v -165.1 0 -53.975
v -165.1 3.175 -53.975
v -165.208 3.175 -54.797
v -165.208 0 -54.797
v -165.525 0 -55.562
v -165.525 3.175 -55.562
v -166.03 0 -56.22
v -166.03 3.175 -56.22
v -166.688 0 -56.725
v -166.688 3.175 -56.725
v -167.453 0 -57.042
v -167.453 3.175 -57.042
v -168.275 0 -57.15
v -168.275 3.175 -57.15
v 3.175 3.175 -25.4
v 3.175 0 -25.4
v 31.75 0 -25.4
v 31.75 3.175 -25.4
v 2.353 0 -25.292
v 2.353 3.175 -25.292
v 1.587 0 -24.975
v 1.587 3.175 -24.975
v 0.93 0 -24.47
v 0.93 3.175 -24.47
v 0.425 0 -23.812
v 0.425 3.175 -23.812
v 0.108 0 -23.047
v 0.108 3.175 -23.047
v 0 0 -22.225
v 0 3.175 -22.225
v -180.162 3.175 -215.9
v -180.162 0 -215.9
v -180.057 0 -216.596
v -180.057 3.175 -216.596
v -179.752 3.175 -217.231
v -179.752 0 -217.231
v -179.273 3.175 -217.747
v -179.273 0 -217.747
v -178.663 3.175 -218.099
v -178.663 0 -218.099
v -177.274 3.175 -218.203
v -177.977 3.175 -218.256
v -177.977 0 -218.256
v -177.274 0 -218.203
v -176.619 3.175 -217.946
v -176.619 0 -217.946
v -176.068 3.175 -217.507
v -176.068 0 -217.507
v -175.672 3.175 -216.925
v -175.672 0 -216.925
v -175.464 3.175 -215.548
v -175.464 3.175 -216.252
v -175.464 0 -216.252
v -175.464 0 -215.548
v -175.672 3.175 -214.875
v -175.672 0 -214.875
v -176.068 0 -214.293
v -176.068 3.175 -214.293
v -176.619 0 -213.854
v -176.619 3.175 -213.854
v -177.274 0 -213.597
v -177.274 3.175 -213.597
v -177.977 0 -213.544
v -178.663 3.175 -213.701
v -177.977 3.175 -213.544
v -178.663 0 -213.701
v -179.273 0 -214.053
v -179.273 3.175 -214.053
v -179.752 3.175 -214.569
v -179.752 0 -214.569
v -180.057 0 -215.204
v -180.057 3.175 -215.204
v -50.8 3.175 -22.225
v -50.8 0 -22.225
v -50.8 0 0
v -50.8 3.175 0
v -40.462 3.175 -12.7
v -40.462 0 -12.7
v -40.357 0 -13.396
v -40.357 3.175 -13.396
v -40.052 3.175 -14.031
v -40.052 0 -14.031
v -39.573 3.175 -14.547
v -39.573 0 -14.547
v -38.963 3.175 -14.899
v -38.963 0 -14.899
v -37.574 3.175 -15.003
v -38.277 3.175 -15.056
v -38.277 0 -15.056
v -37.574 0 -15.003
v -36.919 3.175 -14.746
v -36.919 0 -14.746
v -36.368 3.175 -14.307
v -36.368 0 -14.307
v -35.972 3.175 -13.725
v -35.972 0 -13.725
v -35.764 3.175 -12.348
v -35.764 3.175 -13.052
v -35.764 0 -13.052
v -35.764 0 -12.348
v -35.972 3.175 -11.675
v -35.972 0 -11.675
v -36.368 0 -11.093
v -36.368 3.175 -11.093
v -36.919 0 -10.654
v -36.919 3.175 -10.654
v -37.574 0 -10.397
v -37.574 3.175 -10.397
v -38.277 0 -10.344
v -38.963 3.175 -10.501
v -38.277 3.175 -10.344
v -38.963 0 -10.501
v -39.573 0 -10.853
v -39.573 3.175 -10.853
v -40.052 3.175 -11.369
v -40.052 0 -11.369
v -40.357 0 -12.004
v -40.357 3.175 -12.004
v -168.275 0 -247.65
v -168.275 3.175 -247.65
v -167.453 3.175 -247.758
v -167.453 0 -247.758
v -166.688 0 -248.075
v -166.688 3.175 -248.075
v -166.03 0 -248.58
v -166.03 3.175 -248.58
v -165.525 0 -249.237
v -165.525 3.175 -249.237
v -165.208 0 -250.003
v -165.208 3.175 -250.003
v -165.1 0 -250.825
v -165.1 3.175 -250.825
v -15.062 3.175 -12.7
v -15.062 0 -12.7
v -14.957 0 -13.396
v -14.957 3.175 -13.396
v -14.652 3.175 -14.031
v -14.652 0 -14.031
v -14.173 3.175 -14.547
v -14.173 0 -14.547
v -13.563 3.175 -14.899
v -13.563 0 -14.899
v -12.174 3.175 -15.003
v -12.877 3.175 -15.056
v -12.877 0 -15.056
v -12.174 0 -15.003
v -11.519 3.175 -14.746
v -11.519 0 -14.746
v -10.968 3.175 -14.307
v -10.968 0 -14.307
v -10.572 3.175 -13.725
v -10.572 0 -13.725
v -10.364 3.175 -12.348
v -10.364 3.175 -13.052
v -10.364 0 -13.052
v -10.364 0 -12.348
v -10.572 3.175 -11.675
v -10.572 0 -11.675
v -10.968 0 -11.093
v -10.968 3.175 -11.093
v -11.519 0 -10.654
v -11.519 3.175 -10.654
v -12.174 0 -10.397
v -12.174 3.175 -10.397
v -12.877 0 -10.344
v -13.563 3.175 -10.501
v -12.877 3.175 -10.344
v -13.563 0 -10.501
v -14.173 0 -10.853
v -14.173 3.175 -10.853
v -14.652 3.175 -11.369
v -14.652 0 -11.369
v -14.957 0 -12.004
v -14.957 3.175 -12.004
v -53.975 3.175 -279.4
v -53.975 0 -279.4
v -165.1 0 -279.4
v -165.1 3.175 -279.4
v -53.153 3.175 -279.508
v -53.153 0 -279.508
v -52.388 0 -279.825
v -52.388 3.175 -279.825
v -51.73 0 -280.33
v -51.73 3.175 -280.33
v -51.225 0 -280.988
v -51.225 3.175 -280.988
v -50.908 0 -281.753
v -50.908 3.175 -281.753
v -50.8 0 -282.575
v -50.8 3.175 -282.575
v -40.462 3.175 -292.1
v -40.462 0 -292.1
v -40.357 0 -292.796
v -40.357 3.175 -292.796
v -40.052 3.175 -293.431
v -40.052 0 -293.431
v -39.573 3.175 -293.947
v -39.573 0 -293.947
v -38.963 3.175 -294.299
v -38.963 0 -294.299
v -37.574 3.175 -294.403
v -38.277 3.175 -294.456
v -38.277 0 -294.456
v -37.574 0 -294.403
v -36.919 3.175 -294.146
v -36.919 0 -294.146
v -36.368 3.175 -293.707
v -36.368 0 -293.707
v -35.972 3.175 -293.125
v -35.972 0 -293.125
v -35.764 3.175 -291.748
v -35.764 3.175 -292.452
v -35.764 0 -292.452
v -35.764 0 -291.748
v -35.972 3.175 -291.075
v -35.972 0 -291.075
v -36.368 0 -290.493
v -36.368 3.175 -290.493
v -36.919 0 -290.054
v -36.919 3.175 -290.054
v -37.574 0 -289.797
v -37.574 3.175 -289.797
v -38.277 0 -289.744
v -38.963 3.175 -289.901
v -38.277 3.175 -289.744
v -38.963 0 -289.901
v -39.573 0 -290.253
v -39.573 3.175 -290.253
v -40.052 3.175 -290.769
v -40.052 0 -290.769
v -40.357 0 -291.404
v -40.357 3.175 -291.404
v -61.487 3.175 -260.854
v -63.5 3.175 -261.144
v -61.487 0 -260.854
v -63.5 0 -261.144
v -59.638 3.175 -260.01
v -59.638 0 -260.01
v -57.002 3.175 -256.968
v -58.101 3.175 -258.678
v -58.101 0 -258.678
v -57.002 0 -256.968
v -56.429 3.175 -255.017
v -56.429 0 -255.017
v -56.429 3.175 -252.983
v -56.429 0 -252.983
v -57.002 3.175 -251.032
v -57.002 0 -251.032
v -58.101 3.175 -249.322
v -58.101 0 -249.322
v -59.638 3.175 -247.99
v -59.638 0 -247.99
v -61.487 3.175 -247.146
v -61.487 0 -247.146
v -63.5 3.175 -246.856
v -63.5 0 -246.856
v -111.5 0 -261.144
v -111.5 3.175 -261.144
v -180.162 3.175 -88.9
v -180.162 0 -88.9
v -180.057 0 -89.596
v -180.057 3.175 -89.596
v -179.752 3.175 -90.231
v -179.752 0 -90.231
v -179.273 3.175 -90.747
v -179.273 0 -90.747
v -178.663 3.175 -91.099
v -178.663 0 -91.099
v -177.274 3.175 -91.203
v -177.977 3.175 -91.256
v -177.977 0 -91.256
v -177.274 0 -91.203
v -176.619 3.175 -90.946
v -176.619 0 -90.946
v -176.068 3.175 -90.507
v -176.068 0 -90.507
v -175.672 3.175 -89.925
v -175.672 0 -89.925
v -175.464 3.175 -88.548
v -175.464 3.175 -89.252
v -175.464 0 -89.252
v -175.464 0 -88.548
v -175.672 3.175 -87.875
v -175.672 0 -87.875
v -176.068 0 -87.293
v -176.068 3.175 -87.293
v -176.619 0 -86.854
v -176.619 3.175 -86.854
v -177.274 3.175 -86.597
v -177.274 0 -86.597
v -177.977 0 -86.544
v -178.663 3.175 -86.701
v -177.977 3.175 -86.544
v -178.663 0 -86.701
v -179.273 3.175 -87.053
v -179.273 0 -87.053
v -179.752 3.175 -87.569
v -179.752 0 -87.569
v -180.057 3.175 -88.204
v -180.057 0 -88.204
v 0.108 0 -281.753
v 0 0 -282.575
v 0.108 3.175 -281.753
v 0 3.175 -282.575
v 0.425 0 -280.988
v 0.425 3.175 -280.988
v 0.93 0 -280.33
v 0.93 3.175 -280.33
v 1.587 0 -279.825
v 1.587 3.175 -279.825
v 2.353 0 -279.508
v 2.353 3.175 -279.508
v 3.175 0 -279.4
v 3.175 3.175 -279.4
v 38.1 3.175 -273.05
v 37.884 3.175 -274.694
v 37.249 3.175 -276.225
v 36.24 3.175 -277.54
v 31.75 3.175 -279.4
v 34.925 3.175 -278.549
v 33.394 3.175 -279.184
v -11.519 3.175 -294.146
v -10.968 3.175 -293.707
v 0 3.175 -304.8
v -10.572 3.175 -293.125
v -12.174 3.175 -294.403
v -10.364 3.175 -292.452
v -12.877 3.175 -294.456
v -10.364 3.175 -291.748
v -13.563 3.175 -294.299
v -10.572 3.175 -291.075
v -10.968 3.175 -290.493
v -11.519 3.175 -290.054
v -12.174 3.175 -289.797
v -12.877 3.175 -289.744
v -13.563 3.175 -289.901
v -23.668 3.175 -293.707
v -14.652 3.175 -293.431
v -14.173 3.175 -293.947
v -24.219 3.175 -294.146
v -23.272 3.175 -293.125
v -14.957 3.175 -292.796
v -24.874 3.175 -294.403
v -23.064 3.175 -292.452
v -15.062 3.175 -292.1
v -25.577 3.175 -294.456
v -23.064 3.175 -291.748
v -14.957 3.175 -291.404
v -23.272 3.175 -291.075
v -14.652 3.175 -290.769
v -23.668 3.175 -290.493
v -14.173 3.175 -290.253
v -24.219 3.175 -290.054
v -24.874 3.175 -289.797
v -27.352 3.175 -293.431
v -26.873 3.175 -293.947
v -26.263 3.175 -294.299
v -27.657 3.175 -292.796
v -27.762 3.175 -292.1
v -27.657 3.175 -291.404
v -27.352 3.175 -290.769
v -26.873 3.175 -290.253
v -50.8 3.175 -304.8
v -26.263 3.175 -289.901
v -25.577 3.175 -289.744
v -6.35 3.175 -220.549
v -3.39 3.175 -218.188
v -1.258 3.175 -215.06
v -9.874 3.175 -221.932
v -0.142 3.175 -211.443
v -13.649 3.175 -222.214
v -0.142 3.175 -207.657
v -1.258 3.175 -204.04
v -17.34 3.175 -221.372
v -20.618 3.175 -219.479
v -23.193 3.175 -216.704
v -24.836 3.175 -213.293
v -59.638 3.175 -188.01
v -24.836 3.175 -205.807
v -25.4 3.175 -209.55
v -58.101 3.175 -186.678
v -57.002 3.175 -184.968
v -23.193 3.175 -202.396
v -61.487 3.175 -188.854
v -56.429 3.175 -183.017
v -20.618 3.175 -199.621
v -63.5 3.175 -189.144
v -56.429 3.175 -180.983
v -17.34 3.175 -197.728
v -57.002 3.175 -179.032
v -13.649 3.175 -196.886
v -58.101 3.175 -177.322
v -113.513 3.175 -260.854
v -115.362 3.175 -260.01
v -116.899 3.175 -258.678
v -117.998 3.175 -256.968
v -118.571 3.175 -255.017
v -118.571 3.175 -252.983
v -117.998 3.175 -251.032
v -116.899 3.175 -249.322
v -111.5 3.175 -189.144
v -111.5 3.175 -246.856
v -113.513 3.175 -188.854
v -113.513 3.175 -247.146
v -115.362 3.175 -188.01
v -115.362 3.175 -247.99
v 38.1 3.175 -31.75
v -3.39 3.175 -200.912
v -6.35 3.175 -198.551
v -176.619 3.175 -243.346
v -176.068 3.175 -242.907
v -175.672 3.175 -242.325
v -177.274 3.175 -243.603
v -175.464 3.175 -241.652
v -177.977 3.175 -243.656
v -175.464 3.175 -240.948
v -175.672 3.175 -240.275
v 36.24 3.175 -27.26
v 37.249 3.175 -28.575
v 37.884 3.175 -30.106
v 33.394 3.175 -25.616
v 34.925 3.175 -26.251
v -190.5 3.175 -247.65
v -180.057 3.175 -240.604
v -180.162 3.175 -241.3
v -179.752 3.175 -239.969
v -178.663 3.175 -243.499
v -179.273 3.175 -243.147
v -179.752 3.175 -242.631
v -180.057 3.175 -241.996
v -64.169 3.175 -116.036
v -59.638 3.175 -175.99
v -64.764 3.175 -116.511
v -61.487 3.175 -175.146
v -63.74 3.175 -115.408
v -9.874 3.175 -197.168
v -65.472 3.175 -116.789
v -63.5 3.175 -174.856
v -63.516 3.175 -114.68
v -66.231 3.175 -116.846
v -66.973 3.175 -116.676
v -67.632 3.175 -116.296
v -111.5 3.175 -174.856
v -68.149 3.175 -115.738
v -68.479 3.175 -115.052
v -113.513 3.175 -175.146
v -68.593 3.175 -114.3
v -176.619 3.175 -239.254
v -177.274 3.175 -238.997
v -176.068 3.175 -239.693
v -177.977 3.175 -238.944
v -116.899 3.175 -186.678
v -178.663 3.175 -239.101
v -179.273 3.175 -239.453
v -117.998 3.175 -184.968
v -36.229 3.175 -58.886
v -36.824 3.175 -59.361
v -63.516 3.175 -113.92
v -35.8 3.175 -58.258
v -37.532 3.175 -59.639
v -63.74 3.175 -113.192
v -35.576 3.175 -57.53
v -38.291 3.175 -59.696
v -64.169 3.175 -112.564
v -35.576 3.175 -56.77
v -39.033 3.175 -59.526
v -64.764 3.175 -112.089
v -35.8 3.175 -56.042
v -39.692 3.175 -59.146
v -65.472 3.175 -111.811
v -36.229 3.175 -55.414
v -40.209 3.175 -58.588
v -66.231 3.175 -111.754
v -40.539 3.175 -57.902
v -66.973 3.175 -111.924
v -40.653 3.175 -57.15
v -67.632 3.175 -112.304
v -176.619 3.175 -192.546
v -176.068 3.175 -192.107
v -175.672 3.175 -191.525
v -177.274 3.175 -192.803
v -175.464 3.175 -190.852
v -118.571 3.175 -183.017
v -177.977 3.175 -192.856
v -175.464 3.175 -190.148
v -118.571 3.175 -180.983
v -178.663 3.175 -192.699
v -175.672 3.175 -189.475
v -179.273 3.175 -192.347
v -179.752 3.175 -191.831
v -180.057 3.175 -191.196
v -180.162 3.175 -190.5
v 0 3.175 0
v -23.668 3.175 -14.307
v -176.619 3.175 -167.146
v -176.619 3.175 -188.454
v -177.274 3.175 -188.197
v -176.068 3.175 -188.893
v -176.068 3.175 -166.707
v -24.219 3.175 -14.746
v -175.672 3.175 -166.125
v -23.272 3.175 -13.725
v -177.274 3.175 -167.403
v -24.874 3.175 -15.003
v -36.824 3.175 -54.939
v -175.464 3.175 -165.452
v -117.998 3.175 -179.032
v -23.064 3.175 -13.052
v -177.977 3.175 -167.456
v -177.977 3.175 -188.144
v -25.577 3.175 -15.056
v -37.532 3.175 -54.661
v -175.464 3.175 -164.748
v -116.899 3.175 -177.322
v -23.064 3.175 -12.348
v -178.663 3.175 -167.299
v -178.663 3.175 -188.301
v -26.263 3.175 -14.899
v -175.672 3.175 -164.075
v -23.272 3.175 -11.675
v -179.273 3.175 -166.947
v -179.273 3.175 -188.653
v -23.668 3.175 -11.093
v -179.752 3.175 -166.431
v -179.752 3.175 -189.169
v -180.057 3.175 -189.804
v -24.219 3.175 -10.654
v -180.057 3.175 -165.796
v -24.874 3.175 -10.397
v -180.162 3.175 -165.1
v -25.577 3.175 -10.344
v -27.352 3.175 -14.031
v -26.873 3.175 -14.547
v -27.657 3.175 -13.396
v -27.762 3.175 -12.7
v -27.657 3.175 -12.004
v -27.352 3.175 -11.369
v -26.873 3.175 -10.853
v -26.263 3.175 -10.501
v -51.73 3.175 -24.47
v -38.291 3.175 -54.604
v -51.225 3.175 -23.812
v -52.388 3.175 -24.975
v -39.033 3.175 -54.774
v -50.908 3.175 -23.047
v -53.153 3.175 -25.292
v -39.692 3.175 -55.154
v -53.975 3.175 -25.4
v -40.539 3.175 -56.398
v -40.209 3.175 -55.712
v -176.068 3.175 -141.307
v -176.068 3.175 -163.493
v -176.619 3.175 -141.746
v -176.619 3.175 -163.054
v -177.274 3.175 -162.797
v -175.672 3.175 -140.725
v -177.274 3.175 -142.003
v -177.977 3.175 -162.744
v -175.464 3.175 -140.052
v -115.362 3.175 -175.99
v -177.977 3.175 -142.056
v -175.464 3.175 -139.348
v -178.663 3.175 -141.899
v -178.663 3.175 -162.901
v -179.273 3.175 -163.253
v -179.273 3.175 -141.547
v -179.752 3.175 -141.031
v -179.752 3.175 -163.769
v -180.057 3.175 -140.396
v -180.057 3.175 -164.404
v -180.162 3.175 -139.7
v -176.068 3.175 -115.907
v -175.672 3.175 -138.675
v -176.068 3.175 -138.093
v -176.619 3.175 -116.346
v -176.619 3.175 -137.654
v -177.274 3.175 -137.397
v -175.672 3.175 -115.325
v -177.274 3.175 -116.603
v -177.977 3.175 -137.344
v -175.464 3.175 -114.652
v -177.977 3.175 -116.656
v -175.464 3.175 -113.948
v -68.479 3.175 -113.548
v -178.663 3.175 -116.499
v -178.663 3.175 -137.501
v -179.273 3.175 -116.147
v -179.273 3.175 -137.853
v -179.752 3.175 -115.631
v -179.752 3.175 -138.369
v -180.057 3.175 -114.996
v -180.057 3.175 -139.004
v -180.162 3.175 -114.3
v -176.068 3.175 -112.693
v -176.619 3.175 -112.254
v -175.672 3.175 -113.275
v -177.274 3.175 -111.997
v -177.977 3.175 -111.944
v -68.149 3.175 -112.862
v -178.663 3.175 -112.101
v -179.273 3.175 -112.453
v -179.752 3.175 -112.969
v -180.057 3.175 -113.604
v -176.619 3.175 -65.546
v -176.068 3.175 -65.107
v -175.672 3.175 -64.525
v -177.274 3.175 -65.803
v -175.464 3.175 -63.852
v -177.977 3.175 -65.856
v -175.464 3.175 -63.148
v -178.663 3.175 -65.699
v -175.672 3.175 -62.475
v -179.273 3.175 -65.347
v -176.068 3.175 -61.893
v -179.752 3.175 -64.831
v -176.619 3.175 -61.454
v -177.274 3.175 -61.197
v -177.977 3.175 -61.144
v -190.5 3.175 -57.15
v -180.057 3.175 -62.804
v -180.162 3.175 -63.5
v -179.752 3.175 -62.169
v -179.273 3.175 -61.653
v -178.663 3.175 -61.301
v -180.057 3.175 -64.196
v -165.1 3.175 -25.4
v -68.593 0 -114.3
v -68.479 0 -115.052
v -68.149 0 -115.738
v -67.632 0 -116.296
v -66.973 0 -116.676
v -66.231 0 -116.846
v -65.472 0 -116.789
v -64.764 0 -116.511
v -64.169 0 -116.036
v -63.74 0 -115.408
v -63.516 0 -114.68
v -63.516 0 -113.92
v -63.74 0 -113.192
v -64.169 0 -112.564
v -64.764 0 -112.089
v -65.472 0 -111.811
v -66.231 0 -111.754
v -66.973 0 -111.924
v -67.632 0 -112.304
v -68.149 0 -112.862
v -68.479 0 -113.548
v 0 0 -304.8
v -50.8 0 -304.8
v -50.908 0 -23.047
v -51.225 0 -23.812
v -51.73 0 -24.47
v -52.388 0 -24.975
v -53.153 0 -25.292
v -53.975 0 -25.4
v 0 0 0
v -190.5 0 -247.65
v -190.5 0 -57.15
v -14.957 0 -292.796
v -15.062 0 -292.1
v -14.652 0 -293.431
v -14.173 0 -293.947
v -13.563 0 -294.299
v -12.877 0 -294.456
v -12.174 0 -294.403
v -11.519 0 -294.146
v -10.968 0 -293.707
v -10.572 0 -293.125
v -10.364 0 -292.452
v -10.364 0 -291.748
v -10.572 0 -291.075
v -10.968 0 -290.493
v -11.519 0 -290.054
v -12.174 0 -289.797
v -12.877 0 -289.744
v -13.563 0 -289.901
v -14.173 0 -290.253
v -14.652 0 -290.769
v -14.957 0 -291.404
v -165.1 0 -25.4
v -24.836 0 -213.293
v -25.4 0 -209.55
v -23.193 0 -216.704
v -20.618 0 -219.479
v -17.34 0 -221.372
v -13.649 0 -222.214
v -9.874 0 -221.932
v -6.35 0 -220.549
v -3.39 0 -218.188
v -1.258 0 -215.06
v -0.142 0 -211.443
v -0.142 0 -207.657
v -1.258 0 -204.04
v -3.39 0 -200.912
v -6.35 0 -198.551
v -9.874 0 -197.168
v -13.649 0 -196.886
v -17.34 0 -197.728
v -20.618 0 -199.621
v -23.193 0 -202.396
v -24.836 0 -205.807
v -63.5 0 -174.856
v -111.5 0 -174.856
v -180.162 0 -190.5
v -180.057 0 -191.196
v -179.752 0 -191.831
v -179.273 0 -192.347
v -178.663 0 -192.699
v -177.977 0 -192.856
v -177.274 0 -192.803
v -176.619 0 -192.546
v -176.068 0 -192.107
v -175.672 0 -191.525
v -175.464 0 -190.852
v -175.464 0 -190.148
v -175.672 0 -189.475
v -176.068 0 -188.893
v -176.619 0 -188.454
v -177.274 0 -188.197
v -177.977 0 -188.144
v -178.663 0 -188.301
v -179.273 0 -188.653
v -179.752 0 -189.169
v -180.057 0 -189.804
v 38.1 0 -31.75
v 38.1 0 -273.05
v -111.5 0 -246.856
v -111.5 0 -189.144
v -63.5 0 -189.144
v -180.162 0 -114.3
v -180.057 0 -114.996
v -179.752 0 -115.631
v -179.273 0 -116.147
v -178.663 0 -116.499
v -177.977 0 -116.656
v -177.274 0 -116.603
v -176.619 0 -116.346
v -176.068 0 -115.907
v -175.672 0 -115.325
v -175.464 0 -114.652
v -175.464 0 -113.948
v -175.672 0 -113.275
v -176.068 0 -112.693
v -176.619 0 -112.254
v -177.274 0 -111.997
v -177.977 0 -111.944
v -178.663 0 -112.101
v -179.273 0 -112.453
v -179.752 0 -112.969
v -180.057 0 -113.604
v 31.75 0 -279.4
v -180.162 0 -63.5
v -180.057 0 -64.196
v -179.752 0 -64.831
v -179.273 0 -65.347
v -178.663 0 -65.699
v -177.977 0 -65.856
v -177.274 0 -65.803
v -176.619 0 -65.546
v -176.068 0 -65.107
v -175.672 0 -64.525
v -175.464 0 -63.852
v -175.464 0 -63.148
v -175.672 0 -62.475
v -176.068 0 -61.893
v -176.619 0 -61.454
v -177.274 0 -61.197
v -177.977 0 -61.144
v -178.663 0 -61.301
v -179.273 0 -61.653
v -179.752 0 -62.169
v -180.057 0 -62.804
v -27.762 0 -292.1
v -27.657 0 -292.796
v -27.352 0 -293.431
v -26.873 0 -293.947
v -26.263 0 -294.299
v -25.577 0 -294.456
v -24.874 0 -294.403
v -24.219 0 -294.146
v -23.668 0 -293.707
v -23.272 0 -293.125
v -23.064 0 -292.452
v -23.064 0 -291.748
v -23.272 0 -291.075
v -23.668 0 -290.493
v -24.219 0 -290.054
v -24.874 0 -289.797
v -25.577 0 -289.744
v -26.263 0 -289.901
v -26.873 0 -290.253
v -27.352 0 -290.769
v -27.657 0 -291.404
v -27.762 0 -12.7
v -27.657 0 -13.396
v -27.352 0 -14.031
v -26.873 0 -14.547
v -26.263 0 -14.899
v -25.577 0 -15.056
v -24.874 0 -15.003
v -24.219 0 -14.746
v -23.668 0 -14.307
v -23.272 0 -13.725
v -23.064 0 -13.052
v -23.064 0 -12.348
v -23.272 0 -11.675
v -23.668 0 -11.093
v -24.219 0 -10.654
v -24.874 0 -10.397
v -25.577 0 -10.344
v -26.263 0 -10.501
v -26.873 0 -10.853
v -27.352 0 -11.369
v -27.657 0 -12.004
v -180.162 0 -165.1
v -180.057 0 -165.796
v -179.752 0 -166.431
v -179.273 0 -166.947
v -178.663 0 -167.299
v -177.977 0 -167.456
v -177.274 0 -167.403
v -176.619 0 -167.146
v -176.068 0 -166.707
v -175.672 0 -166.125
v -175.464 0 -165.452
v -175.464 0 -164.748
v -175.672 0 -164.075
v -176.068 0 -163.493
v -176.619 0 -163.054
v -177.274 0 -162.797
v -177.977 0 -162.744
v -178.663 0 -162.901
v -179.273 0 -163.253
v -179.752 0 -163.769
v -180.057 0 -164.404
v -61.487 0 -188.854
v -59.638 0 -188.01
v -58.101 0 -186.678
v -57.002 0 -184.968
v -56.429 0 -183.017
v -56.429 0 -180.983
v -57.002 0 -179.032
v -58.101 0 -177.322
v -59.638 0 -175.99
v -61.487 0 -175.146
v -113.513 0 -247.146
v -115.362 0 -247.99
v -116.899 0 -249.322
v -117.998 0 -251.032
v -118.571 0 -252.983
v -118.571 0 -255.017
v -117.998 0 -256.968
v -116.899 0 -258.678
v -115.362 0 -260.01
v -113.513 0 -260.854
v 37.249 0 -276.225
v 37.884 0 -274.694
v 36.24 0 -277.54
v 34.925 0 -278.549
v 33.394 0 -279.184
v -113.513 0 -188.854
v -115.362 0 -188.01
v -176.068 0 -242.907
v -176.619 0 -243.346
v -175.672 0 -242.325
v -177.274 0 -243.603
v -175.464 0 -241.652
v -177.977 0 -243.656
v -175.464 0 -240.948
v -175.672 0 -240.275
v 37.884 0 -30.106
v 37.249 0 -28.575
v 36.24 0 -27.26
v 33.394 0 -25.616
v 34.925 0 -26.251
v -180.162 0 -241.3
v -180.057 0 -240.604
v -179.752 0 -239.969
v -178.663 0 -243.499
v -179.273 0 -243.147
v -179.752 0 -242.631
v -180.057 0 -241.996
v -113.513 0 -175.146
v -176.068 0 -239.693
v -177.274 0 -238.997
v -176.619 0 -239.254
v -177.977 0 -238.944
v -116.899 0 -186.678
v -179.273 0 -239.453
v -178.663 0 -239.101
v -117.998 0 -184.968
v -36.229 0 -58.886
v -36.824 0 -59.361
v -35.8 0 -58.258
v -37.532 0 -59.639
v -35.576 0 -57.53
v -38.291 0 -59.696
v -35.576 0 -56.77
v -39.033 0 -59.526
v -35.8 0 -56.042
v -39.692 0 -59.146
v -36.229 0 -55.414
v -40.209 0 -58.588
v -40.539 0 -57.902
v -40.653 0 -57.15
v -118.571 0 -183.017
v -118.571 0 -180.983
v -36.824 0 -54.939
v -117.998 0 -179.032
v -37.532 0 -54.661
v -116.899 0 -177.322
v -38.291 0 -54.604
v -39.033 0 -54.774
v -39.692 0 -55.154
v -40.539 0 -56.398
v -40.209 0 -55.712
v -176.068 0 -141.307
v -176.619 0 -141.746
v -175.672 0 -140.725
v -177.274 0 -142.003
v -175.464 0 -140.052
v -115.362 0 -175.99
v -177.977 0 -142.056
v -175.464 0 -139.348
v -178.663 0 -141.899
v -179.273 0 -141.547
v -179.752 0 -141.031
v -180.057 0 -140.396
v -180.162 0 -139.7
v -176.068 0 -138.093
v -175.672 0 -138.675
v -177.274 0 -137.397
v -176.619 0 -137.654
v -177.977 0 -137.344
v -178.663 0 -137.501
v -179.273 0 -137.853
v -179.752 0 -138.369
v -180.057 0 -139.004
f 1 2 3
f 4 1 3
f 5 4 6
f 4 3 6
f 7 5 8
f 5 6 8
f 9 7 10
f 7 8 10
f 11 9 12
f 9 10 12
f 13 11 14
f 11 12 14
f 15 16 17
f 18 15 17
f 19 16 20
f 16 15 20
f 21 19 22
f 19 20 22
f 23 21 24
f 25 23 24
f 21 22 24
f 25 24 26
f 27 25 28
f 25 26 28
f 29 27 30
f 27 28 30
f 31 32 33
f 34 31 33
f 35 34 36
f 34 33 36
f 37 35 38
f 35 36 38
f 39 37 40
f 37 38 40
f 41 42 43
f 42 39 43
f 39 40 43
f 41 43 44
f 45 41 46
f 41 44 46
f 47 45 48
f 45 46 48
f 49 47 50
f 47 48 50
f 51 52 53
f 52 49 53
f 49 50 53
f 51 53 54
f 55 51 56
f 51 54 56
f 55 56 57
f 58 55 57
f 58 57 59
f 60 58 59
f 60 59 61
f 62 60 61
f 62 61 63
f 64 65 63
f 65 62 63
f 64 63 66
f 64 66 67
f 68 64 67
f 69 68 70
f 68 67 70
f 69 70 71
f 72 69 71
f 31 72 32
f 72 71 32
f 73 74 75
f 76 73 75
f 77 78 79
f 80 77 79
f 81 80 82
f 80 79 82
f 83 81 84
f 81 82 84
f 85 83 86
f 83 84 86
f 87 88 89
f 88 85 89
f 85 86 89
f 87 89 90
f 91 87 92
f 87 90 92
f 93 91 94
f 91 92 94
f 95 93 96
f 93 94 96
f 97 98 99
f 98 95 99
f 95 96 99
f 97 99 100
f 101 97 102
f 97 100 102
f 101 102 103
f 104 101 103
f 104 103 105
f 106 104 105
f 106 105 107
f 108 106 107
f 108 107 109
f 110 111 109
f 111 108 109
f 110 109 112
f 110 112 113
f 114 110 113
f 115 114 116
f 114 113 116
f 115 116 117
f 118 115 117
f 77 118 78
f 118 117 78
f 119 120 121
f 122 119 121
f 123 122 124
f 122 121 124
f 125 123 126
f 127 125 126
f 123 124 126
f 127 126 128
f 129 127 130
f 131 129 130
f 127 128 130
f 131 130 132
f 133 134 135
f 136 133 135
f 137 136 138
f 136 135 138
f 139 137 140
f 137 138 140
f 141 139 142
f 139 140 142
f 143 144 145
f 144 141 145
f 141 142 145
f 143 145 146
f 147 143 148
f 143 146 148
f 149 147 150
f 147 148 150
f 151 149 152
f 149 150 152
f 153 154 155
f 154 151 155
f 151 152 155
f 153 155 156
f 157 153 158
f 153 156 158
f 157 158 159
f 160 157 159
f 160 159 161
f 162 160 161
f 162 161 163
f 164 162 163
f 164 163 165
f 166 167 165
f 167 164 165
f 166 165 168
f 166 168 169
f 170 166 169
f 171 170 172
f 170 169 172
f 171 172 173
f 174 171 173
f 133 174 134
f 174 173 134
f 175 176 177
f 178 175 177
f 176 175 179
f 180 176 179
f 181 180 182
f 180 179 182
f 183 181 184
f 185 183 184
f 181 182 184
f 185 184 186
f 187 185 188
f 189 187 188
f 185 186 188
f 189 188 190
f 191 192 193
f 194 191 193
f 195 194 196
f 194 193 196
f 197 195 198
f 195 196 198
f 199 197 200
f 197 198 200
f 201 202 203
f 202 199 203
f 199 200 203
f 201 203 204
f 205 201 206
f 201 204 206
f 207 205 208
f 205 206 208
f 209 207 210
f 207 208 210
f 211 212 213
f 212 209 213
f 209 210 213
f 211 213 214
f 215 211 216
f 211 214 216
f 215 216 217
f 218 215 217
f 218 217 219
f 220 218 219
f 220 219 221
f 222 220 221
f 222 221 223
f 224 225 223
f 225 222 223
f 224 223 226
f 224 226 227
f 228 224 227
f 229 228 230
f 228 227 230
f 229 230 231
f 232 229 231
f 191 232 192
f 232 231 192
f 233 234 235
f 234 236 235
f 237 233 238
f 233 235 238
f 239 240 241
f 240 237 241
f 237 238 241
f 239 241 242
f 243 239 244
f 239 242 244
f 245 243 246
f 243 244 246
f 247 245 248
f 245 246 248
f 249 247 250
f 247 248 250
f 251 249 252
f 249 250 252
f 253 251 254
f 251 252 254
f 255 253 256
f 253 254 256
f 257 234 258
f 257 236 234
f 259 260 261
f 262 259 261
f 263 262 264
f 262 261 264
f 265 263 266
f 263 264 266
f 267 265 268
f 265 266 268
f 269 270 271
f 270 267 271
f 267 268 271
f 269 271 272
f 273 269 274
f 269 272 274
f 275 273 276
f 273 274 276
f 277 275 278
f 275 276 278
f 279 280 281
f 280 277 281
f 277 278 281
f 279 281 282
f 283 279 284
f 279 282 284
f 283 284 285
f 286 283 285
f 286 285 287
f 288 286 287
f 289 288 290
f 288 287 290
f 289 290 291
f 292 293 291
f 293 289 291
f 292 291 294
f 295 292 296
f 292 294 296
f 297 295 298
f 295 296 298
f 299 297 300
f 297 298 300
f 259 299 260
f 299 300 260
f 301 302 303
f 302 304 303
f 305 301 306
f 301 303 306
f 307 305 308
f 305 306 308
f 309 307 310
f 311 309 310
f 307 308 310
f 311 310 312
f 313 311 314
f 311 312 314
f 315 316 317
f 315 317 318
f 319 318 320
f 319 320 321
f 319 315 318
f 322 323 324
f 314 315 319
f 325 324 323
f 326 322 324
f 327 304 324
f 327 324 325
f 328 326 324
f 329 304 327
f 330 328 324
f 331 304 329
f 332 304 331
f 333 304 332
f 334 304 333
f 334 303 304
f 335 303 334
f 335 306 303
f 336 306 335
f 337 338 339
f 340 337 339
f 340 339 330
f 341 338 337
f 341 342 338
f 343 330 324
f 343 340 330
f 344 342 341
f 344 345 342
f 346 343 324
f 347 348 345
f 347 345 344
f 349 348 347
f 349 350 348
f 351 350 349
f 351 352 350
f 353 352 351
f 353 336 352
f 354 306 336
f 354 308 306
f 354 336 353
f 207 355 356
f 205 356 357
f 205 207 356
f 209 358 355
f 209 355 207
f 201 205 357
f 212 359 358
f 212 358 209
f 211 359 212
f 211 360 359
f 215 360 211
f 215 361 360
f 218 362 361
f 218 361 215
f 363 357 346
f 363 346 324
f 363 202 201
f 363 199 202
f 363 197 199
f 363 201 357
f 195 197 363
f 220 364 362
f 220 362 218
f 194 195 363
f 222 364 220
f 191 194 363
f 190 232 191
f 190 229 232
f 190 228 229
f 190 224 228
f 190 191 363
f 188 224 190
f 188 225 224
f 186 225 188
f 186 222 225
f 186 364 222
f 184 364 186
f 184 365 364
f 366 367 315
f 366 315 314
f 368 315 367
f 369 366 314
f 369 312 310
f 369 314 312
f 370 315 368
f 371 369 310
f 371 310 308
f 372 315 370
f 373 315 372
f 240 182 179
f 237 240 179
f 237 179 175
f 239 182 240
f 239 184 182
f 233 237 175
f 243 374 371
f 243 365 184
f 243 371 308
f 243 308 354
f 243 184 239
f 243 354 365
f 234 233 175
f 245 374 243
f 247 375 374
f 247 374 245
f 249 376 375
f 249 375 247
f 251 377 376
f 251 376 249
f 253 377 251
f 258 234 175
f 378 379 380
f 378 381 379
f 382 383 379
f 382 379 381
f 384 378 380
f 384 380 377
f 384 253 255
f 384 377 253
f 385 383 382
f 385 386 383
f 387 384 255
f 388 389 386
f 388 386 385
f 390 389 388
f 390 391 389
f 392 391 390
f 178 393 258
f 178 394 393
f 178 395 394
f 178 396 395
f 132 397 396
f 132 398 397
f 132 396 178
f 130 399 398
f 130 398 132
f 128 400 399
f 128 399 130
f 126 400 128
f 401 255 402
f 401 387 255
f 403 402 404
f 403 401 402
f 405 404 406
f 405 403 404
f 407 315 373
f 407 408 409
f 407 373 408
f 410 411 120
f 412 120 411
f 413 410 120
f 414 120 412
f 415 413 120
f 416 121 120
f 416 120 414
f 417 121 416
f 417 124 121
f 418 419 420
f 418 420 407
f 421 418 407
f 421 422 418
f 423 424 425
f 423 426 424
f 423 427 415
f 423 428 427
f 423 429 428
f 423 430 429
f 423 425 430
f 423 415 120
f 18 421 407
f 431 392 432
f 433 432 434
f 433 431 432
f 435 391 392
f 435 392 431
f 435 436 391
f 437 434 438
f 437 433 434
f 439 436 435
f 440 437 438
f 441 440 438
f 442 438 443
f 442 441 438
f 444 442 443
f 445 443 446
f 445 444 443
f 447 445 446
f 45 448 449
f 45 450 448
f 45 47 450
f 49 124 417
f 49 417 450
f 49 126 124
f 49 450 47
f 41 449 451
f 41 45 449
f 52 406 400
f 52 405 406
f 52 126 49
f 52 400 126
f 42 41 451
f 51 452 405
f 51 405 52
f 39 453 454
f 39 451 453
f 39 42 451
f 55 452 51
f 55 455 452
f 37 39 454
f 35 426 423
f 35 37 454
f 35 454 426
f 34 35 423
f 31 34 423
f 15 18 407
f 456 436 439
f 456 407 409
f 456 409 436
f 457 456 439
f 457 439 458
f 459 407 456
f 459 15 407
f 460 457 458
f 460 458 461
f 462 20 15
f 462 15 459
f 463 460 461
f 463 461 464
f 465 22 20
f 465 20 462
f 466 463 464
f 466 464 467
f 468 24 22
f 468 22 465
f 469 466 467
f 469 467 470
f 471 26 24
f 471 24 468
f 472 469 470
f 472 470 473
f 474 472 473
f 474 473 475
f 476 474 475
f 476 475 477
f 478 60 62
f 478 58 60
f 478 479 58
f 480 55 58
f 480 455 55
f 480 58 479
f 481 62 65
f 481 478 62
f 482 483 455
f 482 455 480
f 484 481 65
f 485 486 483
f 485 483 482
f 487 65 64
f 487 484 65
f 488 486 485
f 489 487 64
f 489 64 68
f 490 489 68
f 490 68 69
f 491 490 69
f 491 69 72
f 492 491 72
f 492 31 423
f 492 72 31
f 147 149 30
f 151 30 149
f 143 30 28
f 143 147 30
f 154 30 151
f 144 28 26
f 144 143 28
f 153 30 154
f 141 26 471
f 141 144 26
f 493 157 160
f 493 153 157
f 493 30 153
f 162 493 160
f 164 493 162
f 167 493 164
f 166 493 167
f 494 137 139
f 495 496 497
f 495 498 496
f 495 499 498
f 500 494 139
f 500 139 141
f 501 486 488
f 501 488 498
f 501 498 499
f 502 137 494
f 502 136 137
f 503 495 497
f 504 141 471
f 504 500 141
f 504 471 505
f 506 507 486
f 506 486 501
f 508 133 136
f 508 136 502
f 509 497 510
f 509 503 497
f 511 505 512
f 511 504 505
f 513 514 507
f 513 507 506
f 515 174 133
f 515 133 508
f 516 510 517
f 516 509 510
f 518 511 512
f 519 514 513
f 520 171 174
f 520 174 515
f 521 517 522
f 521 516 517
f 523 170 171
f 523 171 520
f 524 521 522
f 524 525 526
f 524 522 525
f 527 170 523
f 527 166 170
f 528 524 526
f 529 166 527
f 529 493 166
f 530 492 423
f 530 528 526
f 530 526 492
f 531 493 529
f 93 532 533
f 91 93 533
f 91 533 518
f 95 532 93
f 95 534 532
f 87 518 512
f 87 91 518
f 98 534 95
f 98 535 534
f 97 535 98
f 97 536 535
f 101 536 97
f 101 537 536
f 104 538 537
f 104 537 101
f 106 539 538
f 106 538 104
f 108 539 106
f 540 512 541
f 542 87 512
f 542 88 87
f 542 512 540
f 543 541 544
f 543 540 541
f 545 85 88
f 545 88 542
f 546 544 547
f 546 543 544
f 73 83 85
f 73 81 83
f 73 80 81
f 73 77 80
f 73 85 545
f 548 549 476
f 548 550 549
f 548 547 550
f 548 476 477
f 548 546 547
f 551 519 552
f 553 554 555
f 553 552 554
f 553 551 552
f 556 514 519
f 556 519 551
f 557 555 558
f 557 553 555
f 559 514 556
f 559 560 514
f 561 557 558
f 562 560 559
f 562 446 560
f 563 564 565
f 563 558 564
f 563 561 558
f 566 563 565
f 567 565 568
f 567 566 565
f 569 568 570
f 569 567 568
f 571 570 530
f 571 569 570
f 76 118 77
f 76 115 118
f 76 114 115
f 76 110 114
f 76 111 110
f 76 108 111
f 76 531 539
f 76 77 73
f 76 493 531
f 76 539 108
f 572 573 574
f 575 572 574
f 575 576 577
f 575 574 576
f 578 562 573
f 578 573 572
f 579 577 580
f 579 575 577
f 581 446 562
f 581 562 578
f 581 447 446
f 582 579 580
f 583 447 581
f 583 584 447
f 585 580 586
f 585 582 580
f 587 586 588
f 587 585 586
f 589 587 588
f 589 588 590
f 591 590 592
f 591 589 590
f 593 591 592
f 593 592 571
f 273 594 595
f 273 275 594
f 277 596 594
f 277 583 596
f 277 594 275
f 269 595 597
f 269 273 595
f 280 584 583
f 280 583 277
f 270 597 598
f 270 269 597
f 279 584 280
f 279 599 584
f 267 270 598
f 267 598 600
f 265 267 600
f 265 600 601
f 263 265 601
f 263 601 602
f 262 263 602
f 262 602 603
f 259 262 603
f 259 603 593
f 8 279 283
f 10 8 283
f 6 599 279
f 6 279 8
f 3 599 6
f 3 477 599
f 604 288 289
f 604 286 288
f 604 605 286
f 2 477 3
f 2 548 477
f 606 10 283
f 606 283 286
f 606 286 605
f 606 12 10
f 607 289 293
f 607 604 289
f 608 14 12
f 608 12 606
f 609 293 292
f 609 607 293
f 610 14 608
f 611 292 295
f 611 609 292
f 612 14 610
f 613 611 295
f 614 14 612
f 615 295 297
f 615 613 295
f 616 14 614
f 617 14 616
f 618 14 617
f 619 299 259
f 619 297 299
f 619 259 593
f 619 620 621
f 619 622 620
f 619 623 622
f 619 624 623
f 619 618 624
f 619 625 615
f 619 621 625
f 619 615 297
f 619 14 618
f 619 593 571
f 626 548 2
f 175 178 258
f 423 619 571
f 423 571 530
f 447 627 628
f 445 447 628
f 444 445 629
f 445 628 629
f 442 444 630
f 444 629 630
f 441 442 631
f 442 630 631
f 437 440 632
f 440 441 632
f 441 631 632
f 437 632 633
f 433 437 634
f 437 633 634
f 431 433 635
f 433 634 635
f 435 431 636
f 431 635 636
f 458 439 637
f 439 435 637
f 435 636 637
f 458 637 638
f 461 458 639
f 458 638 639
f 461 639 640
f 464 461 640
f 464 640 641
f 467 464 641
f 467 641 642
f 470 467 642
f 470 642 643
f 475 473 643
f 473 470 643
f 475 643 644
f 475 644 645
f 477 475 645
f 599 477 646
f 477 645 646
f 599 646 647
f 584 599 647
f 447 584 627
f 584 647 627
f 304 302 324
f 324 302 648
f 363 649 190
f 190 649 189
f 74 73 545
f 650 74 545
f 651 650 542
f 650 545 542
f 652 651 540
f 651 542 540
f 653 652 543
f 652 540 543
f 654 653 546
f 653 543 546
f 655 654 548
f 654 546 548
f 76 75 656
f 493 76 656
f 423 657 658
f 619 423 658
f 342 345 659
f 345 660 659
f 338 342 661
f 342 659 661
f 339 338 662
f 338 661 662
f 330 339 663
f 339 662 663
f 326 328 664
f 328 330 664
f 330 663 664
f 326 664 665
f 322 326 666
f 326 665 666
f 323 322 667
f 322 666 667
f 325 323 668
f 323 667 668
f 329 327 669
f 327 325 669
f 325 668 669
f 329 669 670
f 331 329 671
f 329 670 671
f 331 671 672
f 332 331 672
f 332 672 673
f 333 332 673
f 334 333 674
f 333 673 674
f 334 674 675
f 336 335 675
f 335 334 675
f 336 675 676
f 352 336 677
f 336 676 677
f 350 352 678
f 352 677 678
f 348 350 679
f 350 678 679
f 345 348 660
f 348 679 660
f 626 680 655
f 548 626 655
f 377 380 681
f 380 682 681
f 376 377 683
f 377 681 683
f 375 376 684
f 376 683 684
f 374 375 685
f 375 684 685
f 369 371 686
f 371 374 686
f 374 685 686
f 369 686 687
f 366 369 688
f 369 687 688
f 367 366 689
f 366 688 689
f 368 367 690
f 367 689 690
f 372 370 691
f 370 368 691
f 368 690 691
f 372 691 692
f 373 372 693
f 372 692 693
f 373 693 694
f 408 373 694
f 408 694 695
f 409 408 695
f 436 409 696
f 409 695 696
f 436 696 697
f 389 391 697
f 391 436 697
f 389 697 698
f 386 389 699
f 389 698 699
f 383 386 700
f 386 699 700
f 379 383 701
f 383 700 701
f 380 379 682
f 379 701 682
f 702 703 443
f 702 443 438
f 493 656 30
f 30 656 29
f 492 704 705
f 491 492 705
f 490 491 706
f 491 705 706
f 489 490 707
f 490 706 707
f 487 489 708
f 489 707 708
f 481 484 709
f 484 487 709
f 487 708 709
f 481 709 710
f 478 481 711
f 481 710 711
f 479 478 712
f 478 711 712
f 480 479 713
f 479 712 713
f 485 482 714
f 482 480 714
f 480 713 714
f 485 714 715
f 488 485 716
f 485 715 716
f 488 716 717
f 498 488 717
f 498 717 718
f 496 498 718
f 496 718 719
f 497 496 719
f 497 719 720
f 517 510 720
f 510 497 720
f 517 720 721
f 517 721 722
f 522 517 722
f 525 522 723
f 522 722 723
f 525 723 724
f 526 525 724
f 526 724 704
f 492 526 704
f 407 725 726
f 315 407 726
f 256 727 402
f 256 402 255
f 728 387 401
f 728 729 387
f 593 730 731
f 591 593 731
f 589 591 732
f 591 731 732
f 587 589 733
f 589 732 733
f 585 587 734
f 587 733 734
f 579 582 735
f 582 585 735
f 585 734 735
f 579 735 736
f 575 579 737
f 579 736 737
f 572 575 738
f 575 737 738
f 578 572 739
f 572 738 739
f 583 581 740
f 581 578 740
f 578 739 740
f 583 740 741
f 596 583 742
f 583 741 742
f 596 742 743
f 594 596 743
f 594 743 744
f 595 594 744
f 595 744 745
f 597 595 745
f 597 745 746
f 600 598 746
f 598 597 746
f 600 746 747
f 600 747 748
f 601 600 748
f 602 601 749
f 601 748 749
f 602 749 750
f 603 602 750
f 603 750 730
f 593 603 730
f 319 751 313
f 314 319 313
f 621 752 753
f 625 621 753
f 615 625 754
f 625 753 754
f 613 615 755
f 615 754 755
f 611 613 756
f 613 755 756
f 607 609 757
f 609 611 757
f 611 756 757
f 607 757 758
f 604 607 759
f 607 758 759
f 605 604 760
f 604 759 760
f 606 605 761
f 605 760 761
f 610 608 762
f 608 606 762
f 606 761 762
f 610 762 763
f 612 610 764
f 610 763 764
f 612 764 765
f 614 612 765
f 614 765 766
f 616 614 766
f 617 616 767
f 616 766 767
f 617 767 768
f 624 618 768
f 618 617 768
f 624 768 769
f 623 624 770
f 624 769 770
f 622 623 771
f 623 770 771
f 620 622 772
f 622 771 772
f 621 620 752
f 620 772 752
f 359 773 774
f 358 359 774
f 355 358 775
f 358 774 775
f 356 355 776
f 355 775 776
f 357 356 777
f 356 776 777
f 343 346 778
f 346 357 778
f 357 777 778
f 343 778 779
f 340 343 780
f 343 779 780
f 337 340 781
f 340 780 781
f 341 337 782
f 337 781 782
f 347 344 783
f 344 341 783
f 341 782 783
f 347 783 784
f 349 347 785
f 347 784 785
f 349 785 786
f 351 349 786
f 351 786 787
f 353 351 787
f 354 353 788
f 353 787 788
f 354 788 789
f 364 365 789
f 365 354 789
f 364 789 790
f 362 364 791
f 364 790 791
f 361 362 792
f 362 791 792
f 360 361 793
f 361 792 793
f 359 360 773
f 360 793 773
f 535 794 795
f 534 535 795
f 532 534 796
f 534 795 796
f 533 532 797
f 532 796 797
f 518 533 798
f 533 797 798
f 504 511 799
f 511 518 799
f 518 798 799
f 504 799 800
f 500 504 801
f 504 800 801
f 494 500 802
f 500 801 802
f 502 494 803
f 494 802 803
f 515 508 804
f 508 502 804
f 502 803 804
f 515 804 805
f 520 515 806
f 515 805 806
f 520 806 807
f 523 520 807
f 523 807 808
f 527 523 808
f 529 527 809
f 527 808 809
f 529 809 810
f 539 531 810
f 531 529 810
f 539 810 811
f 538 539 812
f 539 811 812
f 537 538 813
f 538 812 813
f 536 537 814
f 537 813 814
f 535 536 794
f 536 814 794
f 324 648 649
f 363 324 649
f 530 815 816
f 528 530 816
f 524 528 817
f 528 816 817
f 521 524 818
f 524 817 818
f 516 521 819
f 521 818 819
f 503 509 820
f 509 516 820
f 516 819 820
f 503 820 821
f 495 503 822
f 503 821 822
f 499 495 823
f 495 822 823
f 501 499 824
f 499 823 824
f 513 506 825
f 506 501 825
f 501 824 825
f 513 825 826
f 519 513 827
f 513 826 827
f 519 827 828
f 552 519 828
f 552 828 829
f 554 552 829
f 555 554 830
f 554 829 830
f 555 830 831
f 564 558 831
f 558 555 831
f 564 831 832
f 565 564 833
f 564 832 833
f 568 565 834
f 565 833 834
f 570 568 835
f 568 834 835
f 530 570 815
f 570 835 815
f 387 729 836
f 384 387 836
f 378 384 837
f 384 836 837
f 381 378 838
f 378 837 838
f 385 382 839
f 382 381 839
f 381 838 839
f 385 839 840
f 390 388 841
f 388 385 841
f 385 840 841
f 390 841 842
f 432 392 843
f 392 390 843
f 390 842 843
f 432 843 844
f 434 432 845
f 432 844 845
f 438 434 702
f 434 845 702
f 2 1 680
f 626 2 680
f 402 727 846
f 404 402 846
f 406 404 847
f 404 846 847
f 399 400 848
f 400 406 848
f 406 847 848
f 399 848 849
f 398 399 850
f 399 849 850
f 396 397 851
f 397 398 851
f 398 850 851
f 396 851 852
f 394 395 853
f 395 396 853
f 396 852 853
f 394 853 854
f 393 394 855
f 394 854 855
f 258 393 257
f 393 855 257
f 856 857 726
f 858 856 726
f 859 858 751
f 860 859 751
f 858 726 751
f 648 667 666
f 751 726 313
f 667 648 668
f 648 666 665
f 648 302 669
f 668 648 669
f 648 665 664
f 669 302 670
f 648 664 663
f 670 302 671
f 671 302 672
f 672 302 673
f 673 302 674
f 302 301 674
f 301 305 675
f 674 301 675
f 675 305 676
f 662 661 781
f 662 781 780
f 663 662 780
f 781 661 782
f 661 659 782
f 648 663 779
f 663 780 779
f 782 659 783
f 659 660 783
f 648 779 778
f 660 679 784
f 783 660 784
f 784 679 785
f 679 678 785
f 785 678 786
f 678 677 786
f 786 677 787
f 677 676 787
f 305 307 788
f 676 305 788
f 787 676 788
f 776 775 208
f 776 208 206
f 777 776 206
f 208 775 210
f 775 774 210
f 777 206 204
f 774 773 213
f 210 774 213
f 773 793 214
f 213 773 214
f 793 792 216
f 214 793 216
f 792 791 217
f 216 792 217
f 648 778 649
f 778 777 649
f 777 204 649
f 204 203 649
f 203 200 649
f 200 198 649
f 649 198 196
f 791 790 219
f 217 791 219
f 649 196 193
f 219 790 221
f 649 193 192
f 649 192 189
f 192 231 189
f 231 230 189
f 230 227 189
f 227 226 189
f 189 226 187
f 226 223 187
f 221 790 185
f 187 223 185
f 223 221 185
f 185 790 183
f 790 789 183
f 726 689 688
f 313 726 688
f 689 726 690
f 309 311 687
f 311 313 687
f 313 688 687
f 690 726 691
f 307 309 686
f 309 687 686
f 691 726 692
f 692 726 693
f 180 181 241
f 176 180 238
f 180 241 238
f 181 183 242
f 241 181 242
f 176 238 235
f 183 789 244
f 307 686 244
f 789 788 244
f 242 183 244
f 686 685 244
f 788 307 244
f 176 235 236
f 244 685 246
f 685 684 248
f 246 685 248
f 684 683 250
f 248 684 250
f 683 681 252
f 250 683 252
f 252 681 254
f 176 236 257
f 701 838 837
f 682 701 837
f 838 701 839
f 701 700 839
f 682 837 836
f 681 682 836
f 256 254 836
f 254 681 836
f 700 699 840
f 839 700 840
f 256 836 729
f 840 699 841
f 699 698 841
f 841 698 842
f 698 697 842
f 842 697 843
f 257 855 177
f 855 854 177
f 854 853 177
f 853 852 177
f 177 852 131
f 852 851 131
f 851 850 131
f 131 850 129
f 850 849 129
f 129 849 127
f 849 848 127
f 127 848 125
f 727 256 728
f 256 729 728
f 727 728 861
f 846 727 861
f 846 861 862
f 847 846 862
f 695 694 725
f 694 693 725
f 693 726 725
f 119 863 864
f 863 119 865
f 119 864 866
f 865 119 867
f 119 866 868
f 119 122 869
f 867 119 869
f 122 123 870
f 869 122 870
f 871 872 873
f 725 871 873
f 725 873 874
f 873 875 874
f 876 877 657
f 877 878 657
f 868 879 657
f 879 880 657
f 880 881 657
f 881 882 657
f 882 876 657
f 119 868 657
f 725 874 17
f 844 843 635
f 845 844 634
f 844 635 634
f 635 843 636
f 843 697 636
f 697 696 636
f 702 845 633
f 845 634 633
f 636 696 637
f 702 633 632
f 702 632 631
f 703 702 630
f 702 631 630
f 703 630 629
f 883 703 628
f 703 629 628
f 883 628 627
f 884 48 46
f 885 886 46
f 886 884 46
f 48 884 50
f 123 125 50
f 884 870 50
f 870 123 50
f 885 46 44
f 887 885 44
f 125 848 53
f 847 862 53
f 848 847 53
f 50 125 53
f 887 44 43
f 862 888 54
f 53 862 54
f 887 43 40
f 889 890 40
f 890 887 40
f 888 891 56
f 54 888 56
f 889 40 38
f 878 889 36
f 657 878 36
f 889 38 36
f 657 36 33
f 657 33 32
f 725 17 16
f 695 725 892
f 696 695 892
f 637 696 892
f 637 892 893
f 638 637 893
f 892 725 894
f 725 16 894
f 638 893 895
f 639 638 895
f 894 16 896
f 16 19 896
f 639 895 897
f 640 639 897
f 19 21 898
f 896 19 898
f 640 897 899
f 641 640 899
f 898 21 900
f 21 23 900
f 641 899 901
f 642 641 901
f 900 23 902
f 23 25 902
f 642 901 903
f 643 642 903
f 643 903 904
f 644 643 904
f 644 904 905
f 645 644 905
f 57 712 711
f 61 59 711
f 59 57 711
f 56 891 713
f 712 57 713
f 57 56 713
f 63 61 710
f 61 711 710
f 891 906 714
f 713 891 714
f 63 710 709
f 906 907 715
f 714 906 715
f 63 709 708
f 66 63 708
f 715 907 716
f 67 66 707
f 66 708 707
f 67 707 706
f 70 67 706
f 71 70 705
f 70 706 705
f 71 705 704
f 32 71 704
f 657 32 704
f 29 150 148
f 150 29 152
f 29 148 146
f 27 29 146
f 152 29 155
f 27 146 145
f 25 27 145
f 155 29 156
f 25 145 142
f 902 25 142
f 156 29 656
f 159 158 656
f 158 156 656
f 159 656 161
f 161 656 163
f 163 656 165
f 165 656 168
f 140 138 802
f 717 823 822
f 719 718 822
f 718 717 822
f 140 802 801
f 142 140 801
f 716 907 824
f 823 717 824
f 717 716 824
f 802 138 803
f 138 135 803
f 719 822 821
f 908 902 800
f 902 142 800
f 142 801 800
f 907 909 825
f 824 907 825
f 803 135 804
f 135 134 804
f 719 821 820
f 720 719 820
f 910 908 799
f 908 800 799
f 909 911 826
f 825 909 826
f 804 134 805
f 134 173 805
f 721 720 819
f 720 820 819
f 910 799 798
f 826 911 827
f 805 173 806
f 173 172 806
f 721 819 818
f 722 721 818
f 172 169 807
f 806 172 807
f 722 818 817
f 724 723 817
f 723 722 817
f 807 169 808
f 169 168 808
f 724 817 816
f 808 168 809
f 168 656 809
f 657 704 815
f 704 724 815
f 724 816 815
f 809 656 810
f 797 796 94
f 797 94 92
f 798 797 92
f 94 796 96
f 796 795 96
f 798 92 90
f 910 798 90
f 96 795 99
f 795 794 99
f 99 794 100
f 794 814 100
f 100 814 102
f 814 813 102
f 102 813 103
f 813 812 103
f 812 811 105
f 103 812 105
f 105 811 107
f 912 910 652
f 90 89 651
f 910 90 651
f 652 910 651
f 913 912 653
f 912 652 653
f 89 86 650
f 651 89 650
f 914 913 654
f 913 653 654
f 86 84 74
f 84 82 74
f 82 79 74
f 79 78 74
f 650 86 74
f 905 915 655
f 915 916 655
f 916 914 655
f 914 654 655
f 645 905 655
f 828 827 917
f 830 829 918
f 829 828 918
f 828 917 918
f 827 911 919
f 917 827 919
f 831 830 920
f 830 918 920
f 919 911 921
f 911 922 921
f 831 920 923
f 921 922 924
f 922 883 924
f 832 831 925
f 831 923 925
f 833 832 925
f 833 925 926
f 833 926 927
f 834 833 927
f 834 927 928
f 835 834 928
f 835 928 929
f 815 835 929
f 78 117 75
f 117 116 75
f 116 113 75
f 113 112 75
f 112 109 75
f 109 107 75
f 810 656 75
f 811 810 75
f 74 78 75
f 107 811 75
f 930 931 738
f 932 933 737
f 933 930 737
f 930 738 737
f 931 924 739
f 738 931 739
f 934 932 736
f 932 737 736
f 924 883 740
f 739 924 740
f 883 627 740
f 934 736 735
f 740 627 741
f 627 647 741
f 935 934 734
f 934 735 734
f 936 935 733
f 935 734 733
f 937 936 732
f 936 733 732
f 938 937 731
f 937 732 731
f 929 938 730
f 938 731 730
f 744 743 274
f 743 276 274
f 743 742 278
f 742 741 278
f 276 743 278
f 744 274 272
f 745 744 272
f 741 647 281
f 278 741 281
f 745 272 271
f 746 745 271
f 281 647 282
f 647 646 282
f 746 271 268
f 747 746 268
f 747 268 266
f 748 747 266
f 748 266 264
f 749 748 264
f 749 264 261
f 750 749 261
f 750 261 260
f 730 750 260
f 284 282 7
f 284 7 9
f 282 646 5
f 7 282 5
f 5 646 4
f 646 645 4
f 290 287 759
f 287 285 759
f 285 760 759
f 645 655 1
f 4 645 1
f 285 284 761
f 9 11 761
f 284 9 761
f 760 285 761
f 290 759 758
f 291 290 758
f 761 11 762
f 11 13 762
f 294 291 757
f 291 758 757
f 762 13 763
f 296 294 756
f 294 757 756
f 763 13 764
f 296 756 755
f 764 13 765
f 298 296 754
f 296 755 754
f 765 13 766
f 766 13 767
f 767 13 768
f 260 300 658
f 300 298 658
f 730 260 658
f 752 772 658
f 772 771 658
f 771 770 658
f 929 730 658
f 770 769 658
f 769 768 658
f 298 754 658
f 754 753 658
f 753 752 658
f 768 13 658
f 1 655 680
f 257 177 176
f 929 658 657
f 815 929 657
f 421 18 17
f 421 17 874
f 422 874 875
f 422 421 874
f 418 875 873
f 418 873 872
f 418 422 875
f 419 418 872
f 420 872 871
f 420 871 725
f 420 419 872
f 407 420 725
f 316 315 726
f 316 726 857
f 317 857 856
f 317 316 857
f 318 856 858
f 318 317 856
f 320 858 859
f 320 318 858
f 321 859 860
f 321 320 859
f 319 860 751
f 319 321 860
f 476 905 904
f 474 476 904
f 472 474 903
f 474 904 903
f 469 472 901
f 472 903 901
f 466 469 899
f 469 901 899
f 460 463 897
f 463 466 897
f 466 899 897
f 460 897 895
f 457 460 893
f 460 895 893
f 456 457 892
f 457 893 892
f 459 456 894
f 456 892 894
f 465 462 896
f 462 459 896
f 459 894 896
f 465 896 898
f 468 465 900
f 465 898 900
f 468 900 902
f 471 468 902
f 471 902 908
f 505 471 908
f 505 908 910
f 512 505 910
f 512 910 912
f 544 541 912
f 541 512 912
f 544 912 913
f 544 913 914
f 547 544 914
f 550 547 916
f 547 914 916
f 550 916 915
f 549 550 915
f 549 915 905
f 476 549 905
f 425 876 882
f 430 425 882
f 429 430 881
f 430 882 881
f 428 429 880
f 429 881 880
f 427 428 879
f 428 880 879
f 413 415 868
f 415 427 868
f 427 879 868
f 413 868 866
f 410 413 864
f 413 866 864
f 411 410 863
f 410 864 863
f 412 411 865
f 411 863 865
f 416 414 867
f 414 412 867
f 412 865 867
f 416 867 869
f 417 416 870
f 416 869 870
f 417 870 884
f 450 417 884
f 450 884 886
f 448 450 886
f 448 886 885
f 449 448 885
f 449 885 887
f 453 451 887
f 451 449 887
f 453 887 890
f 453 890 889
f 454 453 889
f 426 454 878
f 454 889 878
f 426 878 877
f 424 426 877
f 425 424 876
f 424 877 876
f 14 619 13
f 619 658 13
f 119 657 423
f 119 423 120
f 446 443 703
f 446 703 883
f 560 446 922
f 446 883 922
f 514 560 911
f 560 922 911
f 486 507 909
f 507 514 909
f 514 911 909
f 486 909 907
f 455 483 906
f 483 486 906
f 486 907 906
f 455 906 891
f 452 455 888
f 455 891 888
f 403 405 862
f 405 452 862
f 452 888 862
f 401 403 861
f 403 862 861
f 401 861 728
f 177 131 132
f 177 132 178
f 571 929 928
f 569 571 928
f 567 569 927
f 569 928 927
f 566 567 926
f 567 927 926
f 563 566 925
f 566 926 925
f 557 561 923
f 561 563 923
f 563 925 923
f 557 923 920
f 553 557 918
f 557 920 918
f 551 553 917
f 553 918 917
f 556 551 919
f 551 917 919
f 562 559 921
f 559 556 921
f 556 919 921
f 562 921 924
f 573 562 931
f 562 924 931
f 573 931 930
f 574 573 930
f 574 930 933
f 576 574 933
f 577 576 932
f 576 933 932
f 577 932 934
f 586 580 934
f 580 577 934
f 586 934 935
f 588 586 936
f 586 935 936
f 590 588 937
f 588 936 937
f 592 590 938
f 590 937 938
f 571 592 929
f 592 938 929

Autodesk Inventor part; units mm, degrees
ref_plane "YZ Plane" through (0, 0, 0) normal (1, 0, 0) x (0, 1, 0)
ref_plane "XZ Plane" through (0, 0, 0) normal (0, 1, 0) x (-1, 0, 0)
ref_plane "XY Plane" through (0, 0, 0) normal (0, 0, 1) x (1, 0, 0)
sketch "Sketch1" plane through (0, 0, 0) normal (0, 1, 0) x (-1, 0, 0)
  line L0 (-38.1, -25.4) -> (-38.1, -279.4)
  line L1 (0, -304.8) -> (50.8, -304.8)
  line L2 (50.8, -304.8) -> (50.8, -279.4)
  line L3 (50.8, -279.4) -> (190.5, -279.4)
  line L4 (190.5, -279.4) -> (190.5, -25.4)
  line L5 (190.5, -25.4) -> (50.8, -25.4)
  line L6 (50.8, -25.4) -> (50.8, 0)
  line L7 (50.8, 0) -> (0, 0)
  circle A0 centre (38.1, -12.7) radius 2.3622
  circle A1 centre (25.4, -12.7) radius 2.3622
  circle A2 centre (12.7, -12.7) radius 2.3622
  line L8 (-38.1, -152.4) -> (190.5, -152.4) construction
  circle A3 centre (177.8, -139.7) radius 2.3622
  circle A4 centre (177.8, -114.3) radius 2.3622
  circle A5 centre (177.8, -88.9) radius 2.3622
  circle A6 centre (177.8, -63.5) radius 2.3622
  circle A7 centre (38.1, -292.1) radius 2.3622
  circle A8 centre (25.4, -292.1) radius 2.3622
  circle A9 centre (12.7, -292.1) radius 2.3622
  circle A10 centre (177.8, -165.1) radius 2.3622
  circle A11 centre (177.8, -190.5) radius 2.3622
  circle A12 centre (177.8, -215.9) radius 2.3622
  circle A13 centre (177.8, -241.3) radius 2.3622
  line L9 (0, 0) -> (0, -25.4)
  line L10 (0, -25.4) -> (-38.1, -25.4)
  line L11 (-38.1, -279.4) -> (0, -279.4)
  line L12 (0, -279.4) -> (0, -304.8)
  line L13 (190.5, -57.15) -> (165.1, -57.15)
  line L14 (165.1, -57.15) -> (165.1, -25.4)
  line L15 (190.5, -247.65) -> (165.1, -247.65)
  line L16 (165.1, -247.65) -> (165.1, -279.4)
  circle A14 centre (66.04, -114.3) radius 2.5527
  circle A15 centre (38.1, -57.15) radius 2.5527
  circle A16 centre (12.7, -209.55) radius 12.7
  circle A17 centre (12.7, -209.55) radius 28.575 construction
  line L17 (111.5, -254) -> (111.5, -182) construction
  line L18 (111.5, -182) -> (63.5, -182) construction
  line L19 (63.5, -182) -> (63.5, -254) construction
  line L20 (63.5, -254) -> (111.5, -254) construction
  line L21 (111.5, -254) -> (63.5, -254) construction
  line L22 (111.5, -246.8562) -> (63.5, -246.8562)
  line L23 (63.5, -261.1437) -> (111.5, -261.1437)
  arc A18 (111.5, -261.1437) -> (111.5, -246.8562) centre (111.5, -254) ccw
  arc A19 (63.5, -246.8562) -> (63.5, -261.1437) centre (63.5, -254) ccw
  line L24 (111.5, -182) -> (63.5, -182) construction
  line L25 (111.5, -174.8562) -> (63.5, -174.8562)
  line L26 (63.5, -189.1437) -> (111.5, -189.1437)
  arc A20 (111.5, -189.1437) -> (111.5, -174.8562) centre (111.5, -182) ccw
  arc A21 (63.5, -174.8562) -> (63.5, -189.1437) centre (63.5, -182) ccw
  point P0 (177.8, -279.4)
  point P1 (120.65, -279.4)
  point P2 (87.5, -254)
  point P3 (87.5, -182)
  dimension "d0" = 254
  dimension "d1" = 50.8
  dimension "d2" = 25.4
  dimension "d4" = 12.7
  dimension "d5" = 12.7
  dimension "d6" = 12.7
  dimension "d7" = 12.7
  dimension "d8" = 4.7244
  dimension "d9" = 12.7
  dimension "d10" = 12.7
  dimension "d13" = 25.4
  dimension "d20" = 228.6
  dimension "d21" = 38.1
  dimension "d22" = 25.4
  dimension "d23" = 6.35
  dimension "d25" = 5.1054
  dimension "d28" = 57.15
  dimension "d29" = 27.94
  dimension "d31" = 25.4
  dimension "d32" = 57.15
  dimension "d33" = 152.4
  dimension "d34" = 69.85
  dimension "d35" = 72
  dimension "d36" = 48
  dimension "d37" = 14.2875
  dimension "d38" = 14.2875
  dimension "d42" = 38.1
  dimension "d43" = 31.75
  dimension "d44" = 0
  dimension "d45" = 25.4
  dimension "d46" = 63.5
extrude "Extrusion1" add sketch "Sketch1" along normal blind 3.175 contours L10 L9 L7 L6 L5 L14 L13 L4 L15 L16 L3 L2 L1 L12 L11 L0
fillet "Fillet1" radius 3.175 6 edges at (-165.1, 1.5875, -57.15) (-165.1, 1.5875, -247.65) (-50.8, 1.5875, -279.4) (0, 1.5875, -279.4) (0, 1.5875, -25.4) (-50.8, 1.5875, -25.4)
fillet "Fillet2" radius 6.35 2 edges at (38.1, 1.5875, -25.4) (38.1, 1.5875, -279.4)
sketch "Cut Sketch" plane through (0, 3.175, 0) normal (0, 1, 0) x (1, 0, 0)
  arc A0 (38.1, 273.05) -> (31.75, 279.4) centre (31.75, 273.05) ccw
  line L0 (31.75, 279.4) -> (3.175, 279.4)
  arc A1 (0, 282.575) -> (3.175, 279.4) centre (3.175, 282.575) ccw
  line L1 (0, 282.575) -> (0, 304.8)
  line L2 (0, 304.8) -> (-50.8, 304.8)
  line L3 (-50.8, 304.8) -> (-50.8, 282.575)
  arc A2 (-53.975, 279.4) -> (-50.8, 282.575) centre (-53.975, 282.575) ccw
  line L4 (-53.975, 279.4) -> (-165.1, 279.4)
  line L5 (-165.1, 279.4) -> (-165.1, 250.825)
  arc A3 (-168.275, 247.65) -> (-165.1, 250.825) centre (-168.275, 250.825) ccw
  line L6 (-168.275, 247.65) -> (-190.5, 247.65)
  line L7 (-190.5, 247.65) -> (-190.5, 57.15)
  line L8 (-190.5, 57.15) -> (-168.275, 57.15)
  arc A4 (-165.1, 53.975) -> (-168.275, 57.15) centre (-168.275, 53.975) ccw
  line L9 (-165.1, 53.975) -> (-165.1, 25.4)
  line L10 (-165.1, 25.4) -> (-53.975, 25.4)
  arc A5 (-50.8, 22.225) -> (-53.975, 25.4) centre (-53.975, 22.225) ccw
  line L11 (-50.8, 22.225) -> (-50.8, 0)
  line L12 (-50.8, 0) -> (0, 0)
  line L13 (0, 0) -> (0, 22.225)
  arc A6 (3.175, 25.4) -> (0, 22.225) centre (3.175, 22.225) ccw
  line L14 (3.175, 25.4) -> (31.75, 25.4)
  arc A7 (31.75, 25.4) -> (38.1, 31.75) centre (31.75, 31.75) ccw
  line L15 (38.1, 31.75) -> (38.1, 273.05)
  circle A8 centre (-12.7, 209.55) radius 12.7
  circle A9 centre (-66.04, 114.3) radius 2.5527
  circle A10 centre (-25.4, 292.1) radius 2.3622
  circle A11 centre (-177.8, 165.1) radius 2.3622
  circle A12 centre (-177.8, 215.9) radius 2.3622
  circle A13 centre (-177.8, 63.5) radius 2.3622
  circle A14 centre (-177.8, 88.9) radius 2.3622
  circle A15 centre (-177.8, 114.3) radius 2.3622
  circle A16 centre (-177.8, 139.7) radius 2.3622
  circle A17 centre (-12.7, 12.7) radius 2.3622
  circle A18 centre (-25.4, 12.7) radius 2.3622
  circle A19 centre (-38.1, 12.7) radius 2.3622
  circle A20 centre (-177.8, 241.3) radius 2.3622
  circle A21 centre (-177.8, 190.5) radius 2.3622
  circle A22 centre (-38.1, 292.1) radius 2.3622
  circle A23 centre (-12.7, 292.1) radius 2.3622
  circle A24 centre (-38.1, 57.15) radius 2.5527
  arc A25 (-111.5, 189.1437) -> (-111.5, 174.8562) centre (-111.5, 182) ccw
  line L16 (-111.5, 189.1437) -> (-63.5, 189.1437)
  arc A26 (-63.5, 174.8562) -> (-63.5, 189.1437) centre (-63.5, 182) ccw
  line L17 (-63.5, 174.8562) -> (-111.5, 174.8562)
  arc A27 (-111.5, 261.1437) -> (-111.5, 246.8562) centre (-111.5, 254) ccw
  line L18 (-111.5, 261.1437) -> (-63.5, 261.1437)
  arc A28 (-63.5, 246.8562) -> (-63.5, 261.1437) centre (-63.5, 254) ccw
  line L19 (-63.5, 246.8562) -> (-111.5, 246.8562)
properties part number "1561 Daughter Board"
